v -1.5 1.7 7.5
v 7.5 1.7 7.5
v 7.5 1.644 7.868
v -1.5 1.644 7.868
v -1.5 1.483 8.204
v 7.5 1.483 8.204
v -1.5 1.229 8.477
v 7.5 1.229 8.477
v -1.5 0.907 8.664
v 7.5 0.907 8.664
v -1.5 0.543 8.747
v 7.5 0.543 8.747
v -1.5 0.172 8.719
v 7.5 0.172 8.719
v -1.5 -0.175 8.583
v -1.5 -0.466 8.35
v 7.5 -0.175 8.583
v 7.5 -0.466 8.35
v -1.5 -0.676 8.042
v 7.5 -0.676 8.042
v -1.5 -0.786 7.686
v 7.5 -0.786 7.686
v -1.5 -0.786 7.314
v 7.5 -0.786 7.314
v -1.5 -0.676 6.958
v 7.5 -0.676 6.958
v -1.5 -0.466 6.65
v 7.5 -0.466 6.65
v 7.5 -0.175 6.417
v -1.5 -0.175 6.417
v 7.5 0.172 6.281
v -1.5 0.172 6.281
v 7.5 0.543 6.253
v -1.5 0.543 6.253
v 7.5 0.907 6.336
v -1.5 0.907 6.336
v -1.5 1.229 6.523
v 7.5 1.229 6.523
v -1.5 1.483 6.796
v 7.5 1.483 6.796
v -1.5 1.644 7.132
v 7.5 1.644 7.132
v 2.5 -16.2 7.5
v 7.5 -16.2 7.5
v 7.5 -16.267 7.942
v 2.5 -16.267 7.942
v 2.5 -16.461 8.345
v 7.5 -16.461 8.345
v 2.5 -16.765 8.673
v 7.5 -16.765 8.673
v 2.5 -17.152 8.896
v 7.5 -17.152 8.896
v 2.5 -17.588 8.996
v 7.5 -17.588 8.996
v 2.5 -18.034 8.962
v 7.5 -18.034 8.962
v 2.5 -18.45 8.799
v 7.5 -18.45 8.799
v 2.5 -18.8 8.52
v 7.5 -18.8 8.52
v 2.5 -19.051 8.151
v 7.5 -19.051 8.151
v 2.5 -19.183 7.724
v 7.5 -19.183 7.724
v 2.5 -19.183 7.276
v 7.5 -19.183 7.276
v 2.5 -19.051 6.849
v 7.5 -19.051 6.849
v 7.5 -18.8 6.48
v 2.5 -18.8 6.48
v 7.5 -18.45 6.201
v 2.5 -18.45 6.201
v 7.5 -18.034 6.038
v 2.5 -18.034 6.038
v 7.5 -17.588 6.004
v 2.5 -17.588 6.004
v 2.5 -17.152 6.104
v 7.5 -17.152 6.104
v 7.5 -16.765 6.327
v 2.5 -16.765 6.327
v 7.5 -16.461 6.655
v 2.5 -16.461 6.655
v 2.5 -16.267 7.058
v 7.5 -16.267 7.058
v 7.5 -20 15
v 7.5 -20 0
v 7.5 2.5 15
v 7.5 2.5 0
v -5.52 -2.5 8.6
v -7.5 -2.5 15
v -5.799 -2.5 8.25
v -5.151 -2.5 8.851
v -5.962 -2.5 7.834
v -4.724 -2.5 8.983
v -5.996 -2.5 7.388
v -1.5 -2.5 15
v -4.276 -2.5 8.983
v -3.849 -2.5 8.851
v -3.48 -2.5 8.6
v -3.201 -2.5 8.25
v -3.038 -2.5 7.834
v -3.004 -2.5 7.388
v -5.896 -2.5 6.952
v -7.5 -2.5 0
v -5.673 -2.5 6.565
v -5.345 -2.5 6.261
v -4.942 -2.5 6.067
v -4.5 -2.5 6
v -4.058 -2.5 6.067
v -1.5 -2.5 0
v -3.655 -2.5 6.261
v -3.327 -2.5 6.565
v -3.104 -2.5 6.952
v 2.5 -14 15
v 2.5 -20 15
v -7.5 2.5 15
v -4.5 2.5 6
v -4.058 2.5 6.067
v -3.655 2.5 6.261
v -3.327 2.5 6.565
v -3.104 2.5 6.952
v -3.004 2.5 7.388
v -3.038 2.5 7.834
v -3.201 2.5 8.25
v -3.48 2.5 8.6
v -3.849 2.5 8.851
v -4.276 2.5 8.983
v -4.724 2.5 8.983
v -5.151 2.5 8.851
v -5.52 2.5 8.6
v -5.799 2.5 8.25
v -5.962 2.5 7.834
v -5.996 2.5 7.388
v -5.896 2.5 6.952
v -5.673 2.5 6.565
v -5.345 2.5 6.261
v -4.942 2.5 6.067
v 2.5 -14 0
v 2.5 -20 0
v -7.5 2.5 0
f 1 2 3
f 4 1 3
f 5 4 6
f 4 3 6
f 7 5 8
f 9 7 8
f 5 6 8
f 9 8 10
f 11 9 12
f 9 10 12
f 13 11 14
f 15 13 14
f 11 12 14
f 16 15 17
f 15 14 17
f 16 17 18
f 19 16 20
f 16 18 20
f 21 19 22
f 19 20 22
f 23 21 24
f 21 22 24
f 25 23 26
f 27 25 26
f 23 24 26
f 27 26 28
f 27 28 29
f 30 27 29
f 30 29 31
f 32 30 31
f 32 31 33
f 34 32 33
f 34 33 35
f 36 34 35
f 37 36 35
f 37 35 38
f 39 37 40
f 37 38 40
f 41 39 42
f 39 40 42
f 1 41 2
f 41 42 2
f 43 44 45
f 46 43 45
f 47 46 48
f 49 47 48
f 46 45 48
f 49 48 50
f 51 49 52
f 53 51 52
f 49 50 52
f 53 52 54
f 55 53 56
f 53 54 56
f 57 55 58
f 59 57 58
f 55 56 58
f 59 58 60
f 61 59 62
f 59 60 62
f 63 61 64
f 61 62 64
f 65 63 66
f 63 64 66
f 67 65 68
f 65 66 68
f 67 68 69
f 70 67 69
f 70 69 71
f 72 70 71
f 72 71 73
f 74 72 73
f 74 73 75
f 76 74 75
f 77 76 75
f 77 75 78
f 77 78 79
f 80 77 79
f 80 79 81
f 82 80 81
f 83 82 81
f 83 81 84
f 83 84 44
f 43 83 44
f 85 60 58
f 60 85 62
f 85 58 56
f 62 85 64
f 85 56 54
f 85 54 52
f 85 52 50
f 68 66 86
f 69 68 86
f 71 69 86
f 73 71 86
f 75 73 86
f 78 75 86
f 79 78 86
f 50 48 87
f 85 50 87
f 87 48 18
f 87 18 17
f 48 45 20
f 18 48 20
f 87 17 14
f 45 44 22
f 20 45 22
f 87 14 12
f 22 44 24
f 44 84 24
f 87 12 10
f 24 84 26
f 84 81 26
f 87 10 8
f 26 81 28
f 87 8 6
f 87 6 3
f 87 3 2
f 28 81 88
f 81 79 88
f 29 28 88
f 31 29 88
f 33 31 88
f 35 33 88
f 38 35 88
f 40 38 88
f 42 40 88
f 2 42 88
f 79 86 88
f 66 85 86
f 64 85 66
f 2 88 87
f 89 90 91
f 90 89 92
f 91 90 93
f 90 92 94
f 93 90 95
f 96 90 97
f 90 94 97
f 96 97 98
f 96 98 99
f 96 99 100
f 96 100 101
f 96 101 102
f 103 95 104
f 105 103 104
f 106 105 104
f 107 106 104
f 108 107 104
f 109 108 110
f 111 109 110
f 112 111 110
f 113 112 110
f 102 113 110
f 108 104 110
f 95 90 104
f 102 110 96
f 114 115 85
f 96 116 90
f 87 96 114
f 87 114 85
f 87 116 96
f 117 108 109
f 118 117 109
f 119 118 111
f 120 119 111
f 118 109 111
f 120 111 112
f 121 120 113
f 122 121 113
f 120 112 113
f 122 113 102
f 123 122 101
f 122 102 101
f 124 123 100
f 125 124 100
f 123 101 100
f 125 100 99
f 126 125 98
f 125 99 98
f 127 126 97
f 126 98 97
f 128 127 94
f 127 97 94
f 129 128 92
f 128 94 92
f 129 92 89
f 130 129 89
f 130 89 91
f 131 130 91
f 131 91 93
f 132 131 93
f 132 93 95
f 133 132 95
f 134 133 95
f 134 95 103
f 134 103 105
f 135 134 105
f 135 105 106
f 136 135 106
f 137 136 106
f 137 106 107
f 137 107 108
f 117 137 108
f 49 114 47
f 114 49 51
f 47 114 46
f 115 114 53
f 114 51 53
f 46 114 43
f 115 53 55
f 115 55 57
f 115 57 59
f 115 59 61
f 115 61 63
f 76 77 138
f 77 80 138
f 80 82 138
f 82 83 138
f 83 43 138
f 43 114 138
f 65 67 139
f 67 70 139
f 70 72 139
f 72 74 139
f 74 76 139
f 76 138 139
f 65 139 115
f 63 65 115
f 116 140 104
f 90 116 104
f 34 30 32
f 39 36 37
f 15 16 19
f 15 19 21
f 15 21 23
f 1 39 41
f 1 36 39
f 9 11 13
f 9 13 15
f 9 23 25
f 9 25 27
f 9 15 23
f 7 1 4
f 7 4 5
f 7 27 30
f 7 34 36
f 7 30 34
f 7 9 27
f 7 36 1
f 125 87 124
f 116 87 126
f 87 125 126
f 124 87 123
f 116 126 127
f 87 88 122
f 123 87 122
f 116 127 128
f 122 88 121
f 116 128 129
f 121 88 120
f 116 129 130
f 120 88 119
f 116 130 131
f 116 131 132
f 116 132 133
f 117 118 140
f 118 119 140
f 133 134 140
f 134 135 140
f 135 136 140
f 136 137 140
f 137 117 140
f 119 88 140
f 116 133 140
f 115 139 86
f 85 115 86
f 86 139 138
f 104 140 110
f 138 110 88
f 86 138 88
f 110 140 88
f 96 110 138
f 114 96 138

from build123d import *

# Parameters (mm, degrees)
SKIZZE1_W                       = 5
SKIZZE1_H                       = 5
AUFSATZ_LINEAR_AUSTRAGEN1_DEPTH = 15
SKIZZE2_R                       = 1.25
SKIZZE2_R_2                     = 1.5
SCHNITT_LINEAR_AUSTRAGEN1_DEPTH = 9
SKIZZE3_R                       = 1.5
SCHNITT_LINEAR_AUSTRAGEN2_DEPTH = 9


with BuildPart() as part:
    # Skizze1 → Aufsatz-Linear austragen1 (new body)
    with BuildSketch(Plane.XY):
        Polygon((-7.5, -2.5), (-1.5, -2.5), (2.5, -2.5), (2.5, 2.5), (-7.5, 2.5), align=None)
        with Locations((5, 0)):
            Rectangle(SKIZZE1_W, SKIZZE1_H)
        Polygon((2.5, -2.5), (-1.5, -2.5), (2.5, -14), align=None)
        Polygon((2.5, -2.5), (2.5, -14), (2.5, -20), (7.5, -20), (7.5, -2.5), align=None)
    extrude(amount=AUFSATZ_LINEAR_AUSTRAGEN1_DEPTH)

    # Skizze2 → Schnitt-Linear austragen1 (cut)
    with BuildSketch(Plane(origin=(7.5, 0, 0), x_dir=(0, 0, -1), z_dir=(1, 0, 0))):
        with Locations(Location((-7.5, 0.45, 0), (0, 0, 90))):
            Circle(SKIZZE2_R)
        with Locations(Location((-7.5, -17.7, 0), (0, 0, 90))):
            Circle(SKIZZE2_R_2)
    extrude(amount=-SCHNITT_LINEAR_AUSTRAGEN1_DEPTH, mode=Mode.SUBTRACT)

    # Skizze3 → Schnitt-Linear austragen2 (cut)
    with BuildSketch(Plane.XZ.offset(2.5)):
        with Locations(Location((-4.5, 7.5, 0), (0, 0, 270))):
            Circle(SKIZZE3_R)
    extrude(amount=-SCHNITT_LINEAR_AUSTRAGEN2_DEPTH, mode=Mode.SUBTRACT)


solid = part.part
